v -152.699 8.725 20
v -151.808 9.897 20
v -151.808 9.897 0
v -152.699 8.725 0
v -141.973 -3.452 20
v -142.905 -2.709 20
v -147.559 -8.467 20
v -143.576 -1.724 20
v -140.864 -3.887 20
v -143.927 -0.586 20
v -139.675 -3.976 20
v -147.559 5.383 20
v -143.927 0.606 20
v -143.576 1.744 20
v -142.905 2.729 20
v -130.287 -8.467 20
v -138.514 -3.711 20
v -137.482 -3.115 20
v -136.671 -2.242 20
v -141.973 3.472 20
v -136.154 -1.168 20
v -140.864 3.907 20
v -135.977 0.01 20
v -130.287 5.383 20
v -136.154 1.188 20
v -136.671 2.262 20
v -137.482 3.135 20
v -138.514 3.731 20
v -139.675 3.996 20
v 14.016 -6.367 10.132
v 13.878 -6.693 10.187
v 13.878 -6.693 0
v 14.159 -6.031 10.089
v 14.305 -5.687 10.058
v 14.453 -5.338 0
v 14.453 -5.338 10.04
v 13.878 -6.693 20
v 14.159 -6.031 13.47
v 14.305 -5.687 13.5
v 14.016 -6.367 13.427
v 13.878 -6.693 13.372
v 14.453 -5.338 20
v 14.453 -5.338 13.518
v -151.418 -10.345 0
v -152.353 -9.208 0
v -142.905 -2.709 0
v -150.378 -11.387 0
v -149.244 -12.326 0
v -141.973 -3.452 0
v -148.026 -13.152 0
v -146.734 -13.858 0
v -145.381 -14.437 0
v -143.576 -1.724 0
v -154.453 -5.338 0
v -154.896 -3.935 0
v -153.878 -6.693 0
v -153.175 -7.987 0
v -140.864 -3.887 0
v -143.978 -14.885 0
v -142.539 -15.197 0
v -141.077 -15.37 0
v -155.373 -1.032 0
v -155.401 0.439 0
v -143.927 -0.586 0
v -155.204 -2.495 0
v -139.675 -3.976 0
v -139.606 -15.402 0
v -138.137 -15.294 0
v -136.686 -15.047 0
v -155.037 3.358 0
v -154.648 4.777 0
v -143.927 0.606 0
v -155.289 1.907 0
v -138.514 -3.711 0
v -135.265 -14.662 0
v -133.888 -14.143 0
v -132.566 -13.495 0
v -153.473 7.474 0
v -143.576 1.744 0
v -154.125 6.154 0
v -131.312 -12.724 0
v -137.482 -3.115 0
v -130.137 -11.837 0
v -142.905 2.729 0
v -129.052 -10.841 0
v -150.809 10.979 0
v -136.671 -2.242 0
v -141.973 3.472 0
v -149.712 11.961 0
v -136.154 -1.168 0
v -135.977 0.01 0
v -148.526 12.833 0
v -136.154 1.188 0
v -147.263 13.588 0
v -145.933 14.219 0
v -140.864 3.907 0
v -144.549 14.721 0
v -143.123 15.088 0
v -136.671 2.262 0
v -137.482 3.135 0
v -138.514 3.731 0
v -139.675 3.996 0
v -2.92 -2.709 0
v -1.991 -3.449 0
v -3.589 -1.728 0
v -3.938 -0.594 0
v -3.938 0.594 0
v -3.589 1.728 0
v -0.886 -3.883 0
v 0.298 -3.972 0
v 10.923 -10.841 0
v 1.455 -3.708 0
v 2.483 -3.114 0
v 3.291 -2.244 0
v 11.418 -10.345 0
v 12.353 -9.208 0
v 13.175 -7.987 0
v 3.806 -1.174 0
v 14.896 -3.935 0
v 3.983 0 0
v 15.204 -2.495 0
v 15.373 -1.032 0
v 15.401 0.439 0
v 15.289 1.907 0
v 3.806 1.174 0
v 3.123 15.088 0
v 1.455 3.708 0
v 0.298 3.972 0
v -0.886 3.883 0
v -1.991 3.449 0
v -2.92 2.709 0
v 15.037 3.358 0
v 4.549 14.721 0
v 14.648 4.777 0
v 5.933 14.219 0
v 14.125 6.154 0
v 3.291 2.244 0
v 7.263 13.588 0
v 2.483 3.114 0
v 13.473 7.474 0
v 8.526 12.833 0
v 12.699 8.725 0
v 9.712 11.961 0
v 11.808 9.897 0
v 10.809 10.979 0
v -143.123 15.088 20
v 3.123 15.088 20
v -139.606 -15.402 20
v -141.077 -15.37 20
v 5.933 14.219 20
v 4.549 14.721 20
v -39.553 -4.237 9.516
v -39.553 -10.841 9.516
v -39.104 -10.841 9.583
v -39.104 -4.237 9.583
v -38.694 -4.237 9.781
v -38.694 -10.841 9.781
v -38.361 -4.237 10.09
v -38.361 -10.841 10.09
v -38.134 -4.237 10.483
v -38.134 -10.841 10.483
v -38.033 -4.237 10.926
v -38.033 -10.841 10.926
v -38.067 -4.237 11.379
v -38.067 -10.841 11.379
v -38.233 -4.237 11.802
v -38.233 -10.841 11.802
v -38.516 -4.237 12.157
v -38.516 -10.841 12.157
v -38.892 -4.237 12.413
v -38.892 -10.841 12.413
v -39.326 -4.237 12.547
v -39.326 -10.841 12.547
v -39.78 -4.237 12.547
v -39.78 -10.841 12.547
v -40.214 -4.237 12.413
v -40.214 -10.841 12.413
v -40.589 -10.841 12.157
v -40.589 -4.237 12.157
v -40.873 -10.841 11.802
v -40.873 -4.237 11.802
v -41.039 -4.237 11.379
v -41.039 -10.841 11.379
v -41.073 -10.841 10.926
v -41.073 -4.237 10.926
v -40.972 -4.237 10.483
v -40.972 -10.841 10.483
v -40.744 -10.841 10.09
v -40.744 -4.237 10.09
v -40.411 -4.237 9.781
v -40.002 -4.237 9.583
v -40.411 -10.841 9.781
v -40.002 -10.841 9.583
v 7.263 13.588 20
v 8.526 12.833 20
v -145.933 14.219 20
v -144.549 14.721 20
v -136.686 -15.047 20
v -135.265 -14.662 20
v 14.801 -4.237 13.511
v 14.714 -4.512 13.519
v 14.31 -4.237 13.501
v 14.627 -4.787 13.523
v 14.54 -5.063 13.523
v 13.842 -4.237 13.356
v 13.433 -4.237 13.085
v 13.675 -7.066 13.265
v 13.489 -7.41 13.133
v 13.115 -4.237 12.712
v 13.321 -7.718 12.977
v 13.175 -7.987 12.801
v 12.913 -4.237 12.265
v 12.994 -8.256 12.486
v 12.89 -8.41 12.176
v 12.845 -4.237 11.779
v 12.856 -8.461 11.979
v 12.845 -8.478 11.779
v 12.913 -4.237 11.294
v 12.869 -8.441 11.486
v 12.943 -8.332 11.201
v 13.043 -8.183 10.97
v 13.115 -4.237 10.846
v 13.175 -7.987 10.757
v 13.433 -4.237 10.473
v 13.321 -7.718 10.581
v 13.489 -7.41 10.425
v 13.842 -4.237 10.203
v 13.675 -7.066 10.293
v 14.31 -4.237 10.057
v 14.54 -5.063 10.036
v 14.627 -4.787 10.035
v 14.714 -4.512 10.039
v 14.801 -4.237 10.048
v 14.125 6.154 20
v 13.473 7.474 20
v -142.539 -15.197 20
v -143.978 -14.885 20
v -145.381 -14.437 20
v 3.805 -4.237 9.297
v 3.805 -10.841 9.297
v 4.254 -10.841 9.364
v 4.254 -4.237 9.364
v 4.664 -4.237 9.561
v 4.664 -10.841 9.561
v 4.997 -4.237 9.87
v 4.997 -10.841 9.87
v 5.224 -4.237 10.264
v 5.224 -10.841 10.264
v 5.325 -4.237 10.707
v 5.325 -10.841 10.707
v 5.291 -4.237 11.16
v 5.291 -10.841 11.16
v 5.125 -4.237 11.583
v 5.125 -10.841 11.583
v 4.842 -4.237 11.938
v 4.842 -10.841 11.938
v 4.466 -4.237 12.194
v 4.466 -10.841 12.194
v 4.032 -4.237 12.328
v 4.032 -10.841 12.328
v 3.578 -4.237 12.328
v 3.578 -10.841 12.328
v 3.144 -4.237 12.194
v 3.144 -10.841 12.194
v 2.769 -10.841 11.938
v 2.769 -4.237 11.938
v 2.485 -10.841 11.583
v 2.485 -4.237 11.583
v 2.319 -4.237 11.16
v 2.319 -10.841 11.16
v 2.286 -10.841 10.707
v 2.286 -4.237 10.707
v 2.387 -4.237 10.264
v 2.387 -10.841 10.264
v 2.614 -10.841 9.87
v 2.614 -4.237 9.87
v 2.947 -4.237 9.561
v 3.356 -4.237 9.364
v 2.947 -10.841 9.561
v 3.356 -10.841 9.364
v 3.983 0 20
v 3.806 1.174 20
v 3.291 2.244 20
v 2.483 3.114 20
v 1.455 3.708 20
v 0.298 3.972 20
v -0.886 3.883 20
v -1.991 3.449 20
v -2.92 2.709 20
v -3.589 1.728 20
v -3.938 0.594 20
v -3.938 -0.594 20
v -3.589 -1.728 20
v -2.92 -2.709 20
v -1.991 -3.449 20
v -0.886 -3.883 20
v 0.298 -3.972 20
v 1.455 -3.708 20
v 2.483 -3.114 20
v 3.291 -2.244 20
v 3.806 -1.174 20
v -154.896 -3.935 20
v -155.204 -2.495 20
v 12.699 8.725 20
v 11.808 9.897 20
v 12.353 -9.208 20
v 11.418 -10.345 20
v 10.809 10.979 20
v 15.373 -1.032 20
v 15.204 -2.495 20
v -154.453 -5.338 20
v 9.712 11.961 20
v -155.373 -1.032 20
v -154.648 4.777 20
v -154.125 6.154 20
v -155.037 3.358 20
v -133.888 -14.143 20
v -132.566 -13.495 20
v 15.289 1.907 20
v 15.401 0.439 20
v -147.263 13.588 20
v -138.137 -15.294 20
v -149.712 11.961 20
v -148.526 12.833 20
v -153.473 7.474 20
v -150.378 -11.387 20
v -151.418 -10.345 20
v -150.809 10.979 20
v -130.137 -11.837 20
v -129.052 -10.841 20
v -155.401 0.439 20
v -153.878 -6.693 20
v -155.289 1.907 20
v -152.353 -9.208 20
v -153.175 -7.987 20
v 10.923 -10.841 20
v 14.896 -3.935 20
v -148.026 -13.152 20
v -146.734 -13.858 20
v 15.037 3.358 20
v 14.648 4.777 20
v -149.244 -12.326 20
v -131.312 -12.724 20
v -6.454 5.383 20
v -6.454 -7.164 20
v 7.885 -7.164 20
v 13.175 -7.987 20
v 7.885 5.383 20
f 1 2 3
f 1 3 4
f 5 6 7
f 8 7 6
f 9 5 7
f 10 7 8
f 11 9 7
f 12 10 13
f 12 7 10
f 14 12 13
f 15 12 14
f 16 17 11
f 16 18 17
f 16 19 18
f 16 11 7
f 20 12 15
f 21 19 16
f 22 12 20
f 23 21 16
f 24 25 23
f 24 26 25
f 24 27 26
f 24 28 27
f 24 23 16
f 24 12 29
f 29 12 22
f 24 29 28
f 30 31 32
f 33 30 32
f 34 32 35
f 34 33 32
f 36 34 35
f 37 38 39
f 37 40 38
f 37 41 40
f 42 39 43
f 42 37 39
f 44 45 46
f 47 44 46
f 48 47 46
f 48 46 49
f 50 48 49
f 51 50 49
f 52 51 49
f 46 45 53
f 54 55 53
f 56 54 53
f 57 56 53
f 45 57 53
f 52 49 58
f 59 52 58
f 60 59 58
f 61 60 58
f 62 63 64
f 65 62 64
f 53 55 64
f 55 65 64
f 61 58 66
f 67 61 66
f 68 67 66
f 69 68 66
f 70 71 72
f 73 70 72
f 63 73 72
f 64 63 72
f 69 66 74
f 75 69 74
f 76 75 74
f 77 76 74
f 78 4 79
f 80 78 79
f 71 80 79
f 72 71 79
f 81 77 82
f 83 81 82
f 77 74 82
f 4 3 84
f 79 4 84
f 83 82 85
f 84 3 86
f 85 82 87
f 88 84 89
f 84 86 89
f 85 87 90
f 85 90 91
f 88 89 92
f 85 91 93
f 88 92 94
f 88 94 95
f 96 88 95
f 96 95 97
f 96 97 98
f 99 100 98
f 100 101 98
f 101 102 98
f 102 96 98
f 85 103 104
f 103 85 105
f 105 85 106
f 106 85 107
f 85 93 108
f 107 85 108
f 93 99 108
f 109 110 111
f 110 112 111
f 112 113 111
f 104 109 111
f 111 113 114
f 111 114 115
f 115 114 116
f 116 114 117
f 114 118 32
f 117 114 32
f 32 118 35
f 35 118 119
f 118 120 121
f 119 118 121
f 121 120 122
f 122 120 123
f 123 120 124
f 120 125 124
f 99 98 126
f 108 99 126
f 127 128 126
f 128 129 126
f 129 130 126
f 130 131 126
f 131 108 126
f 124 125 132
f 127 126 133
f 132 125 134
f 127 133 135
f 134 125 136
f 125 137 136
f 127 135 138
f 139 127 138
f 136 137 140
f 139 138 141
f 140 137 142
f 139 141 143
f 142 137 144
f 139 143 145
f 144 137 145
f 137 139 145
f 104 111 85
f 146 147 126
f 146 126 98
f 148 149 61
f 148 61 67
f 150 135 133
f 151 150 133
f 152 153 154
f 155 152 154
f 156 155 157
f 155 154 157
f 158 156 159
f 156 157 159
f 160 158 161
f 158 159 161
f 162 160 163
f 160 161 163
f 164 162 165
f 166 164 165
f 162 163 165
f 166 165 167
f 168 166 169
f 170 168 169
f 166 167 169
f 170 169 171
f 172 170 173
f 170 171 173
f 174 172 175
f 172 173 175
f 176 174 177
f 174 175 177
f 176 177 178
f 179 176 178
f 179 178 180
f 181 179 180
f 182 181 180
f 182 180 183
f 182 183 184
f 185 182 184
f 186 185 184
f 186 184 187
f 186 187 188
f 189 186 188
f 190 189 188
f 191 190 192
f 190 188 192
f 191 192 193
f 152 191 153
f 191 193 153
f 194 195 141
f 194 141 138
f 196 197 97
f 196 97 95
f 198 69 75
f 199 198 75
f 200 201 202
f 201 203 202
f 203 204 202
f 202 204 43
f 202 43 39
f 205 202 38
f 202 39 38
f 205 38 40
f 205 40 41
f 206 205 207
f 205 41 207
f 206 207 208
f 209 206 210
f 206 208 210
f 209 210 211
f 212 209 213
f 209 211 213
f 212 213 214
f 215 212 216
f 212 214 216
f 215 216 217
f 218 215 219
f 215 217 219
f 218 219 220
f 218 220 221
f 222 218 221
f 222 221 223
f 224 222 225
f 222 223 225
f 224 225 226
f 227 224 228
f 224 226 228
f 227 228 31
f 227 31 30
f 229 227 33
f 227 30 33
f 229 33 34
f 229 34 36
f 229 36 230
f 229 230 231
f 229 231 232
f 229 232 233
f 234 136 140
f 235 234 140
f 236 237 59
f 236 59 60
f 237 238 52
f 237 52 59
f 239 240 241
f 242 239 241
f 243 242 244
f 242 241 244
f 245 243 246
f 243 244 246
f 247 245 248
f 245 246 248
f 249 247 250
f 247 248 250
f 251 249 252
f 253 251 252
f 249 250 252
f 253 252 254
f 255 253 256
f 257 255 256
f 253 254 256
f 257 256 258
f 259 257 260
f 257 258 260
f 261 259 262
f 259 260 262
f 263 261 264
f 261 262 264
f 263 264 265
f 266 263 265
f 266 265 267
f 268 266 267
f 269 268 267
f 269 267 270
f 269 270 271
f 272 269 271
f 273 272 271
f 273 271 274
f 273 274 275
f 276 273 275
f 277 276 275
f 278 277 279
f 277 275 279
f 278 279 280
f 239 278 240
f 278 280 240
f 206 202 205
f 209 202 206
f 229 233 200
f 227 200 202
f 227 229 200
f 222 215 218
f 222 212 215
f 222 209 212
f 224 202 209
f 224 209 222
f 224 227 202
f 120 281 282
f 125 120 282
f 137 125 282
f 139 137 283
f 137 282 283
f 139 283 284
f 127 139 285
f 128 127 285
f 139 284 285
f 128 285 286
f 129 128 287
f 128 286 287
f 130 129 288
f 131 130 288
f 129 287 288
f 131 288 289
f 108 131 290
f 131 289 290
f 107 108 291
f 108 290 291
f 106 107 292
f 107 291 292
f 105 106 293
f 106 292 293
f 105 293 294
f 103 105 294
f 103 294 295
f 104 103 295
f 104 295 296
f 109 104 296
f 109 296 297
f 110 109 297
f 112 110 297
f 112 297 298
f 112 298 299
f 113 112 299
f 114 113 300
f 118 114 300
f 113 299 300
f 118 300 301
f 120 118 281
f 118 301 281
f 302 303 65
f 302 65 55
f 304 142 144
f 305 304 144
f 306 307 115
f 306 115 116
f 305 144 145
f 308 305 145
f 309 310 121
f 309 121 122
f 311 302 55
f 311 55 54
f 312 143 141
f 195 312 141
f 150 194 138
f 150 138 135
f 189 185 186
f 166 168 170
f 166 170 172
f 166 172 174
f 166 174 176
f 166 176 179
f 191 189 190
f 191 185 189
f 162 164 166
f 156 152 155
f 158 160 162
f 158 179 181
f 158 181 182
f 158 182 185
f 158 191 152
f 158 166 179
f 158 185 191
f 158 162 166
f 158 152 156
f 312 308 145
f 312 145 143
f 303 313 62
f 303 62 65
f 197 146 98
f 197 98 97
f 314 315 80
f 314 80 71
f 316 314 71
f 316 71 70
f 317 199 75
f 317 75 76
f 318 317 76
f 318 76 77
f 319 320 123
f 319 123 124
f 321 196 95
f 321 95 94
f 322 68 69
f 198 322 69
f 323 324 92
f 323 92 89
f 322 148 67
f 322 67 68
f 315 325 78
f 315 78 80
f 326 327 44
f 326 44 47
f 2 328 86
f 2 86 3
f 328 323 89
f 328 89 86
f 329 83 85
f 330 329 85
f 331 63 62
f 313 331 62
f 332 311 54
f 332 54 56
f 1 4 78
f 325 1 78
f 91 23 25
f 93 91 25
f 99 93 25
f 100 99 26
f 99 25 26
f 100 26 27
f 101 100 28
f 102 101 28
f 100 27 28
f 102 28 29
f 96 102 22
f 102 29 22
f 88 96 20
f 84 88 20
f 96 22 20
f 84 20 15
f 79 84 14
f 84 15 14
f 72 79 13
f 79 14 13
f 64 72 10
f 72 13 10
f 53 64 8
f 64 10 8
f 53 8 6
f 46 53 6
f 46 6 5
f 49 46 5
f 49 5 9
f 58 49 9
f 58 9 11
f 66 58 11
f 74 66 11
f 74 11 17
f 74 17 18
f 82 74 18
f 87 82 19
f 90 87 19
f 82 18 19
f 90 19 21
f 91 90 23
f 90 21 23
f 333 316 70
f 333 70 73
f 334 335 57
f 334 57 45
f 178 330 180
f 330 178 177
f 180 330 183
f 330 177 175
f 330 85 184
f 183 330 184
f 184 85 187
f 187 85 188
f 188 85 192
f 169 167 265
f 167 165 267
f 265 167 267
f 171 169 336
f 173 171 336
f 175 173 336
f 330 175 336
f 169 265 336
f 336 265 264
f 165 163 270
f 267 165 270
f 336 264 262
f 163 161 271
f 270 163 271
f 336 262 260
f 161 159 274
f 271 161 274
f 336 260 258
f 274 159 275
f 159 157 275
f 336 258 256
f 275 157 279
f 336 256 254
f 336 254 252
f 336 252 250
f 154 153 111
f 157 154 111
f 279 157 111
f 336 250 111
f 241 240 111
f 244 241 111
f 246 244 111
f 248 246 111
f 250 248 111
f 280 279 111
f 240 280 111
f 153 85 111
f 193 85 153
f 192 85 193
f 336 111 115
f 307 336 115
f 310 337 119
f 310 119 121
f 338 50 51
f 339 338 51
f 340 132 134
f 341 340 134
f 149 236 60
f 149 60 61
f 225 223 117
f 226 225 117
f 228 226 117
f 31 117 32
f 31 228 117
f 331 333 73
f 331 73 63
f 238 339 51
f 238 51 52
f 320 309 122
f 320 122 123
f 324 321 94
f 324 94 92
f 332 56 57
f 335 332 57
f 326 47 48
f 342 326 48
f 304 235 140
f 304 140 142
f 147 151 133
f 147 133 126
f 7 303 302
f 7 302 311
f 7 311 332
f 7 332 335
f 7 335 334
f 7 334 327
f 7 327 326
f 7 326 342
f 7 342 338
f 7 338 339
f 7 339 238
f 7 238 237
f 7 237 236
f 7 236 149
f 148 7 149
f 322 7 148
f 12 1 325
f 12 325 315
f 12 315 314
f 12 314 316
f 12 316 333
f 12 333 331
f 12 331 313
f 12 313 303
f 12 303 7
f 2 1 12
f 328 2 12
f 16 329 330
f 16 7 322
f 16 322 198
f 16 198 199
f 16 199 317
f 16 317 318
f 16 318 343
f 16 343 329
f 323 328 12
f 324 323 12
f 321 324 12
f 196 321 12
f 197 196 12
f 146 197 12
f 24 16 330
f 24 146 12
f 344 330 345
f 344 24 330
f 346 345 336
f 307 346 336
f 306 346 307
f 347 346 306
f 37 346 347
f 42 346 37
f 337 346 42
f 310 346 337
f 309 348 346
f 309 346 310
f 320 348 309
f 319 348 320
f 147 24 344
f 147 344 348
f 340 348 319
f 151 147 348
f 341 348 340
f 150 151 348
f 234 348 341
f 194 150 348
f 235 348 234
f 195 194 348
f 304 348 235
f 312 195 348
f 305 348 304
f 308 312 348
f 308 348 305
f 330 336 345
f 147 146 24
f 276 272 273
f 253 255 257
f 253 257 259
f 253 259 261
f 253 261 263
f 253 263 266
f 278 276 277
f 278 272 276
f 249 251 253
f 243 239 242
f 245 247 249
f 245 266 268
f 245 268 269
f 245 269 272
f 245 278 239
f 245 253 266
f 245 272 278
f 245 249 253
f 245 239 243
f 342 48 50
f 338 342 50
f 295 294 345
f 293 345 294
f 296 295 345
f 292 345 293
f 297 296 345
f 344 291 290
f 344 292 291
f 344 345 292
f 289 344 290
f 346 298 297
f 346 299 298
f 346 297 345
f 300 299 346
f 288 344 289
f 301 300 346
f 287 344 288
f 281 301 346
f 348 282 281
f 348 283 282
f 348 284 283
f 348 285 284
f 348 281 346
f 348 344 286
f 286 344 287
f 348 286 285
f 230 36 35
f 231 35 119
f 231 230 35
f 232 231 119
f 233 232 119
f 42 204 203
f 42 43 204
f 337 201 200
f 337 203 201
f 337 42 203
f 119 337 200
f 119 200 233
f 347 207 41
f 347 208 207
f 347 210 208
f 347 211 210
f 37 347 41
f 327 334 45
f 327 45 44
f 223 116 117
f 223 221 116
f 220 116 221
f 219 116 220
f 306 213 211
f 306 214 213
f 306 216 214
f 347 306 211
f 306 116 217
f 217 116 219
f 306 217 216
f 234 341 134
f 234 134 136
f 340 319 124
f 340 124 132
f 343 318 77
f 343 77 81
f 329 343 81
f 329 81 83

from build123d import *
from OCP.BRepAlgoAPI import BRepAlgoAPI_Cut
from OCP.TopTools import TopTools_ListOfShape

# Parameters (mm, degrees)
BOSS_EXTRUDE1_DEPTH      = 19.999999553
CUT_EXTRUDE1_DEPTH       = 158.4379932
CUT_EXTRUDE2_DEPTH       = 158.4379932
SKETCH7_W                = 17.271465807
SKETCH7_H                = 13.849760317
SKETCH7_W_2              = 14.338575387
SKETCH7_H_2              = 12.546253463
BOSS_EXTRUDE4_DEPTH      = 20
SKETCH6_R                = 3.997536833
SKETCH6_R_2              = 3.982936498
CUT_EXTRUDE4_DEPTH       = 20
SPLIT1_SURFACE_1_BACK    = 175.651
SPLIT1_SURFACE_1_DEPTH   = 351.302
SPLIT1_SURFACE_2_BACK    = 175.651
SPLIT1_SURFACE_2_DEPTH   = 351.302
BODY_DELETE_KEEP_3_DEPTH = 19.999999553
SKETCH15_R               = 1.744345672
CUT_EXTRUDE8_DEPTH       = 6.604
SKETCH18_R               = 1.524
CUT_EXTRUDE10_DEPTH      = 6.604
SKETCH21_R               = 1.524
CUT_EXTRUDE12_DEPTH      = 6.604


with BuildPart() as part:
    # Sketch1 → Boss-Extrude1 (new body)
    with BuildSketch(Plane.XY.offset(19.999999553)):
        Polygon((-147.262692451, 13.588201255), (-148.526370525, 12.833039276), (-149.712219834, 11.960721575), (-150.809392333, 10.979211889), (-151.807874441, 9.897469543), (-152.69857645, 8.725371212), (-153.473347425, 7.473616395), (-154.125109315, 6.153633818), (-154.647916555, 4.777472466), (-155.037015676, 3.357697045), (-155.2888304, 1.907268073), (-155.401065946, 0.439427269), (-155.372709036, -1.032425207), (-155.203998089, -2.494852291), (-154.896497726, -3.934503533), (-154.453009367, -5.338235293), (-153.877556324, -6.69323327), (-153.175413609, -7.987127639), (-152.353018522, -9.208105505), (-151.417821646, -10.3450194), (-150.378391147, -11.387491599), (-149.244219065, -12.326003984), (-148.025646806, -13.15199025), (-146.733820438, -13.857908547), (-145.38051188, -14.437315054), (-143.978089094, -14.884918928), (-142.539337277, -15.196635388), (-141.077414155, -15.36961738), (-139.605656266, -15.402286313), (-138.137474656, -15.294345096), (-136.686325073, -15.046778135), (-135.265409946, -14.661843888), (-133.887723088, -14.143059961), (-132.565841079, -13.495159335), (-131.311833858, -12.724057771), (-130.137130618, -11.836796999), (-129.052475095, -10.841473937), (-10.947530158, -10.841473937), (-9.862869047, -11.836796999), (-8.688169532, -12.724057771), (-7.434152998, -13.495159335), (-6.112268195, -14.143059961), (-4.734582733, -14.661843888), (-3.313674591, -15.046778135), (-1.862514997, -15.294345096), (-0.394351926, -15.402286313), (1.077411231, -15.36961738), (2.539338311, -15.196635388), (3.978083376, -14.884918928), (5.380511284, -14.437315054), (6.733819377, -13.857908547), (8.025652729, -13.15199025), (9.244217537, -12.326003984), (10.378391482, -11.387491599), (11.417816393, -10.3450194), (12.35300675, -9.208105505), (13.175422326, -7.987127639), (13.877556659, -6.69323327), (14.453000389, -5.338235293), (14.896498062, -3.934503533), (15.204001218, -2.494852291), (15.372704715, -1.032425207), (15.401067212, 0.439427269), (15.288828872, 1.907268073), (15.03701508, 3.357697045), (14.647925273, 4.777472466), (14.125110582, 6.153633818), (13.473344967, 7.473616395), (12.698576786, 8.725371212), (11.807881296, 9.897469543), (10.809388012, 10.979211889), (9.71221365, 11.960721575), (8.526373655, 12.833039276), (7.262694649, 13.588201255), (5.932712927, 14.21931386), (4.548569676, 14.720613137), (3.122901777, 15.087526292), (-143.122896552, 15.087526292), (-144.548565149, 14.720613137), (-145.93270421, 14.21931386), align=None)
    extrude(amount=-BOSS_EXTRUDE1_DEPTH)

    # Sketch2 → Cut-Extrude1 (cut, through all)
    with BuildSketch(Plane(origin=(0, 0, 0), x_dir=(-1, 0, 0), z_dir=(0, 0, -1))):
        Polygon((138.905346394, 3.847302636), (138.217046857, 3.580653109), (137.589469552, 3.192068776), (137.043967843, 2.694782568), (136.599138379, 2.105728723), (136.270105839, 1.444966649), (136.068105698, 0.73499803), (136.000007391, 0), (136.068105698, -0.73499803), (136.270105839, -1.444966649), (136.599138379, -2.105728723), (137.043967843, -2.694782568), (137.589469552, -3.192068776), (138.217046857, -3.580653109), (138.905346394, -3.847302636), (139.630913734, -3.982936498), (140.369072556, -3.982936498), (141.094654799, -3.847302636), (141.782954335, -3.580653109), (142.41053164, -3.192068776), (142.956033349, -2.694782568), (143.400862813, -2.105728723), (143.729895353, -1.444966649), (143.931895494, -0.73499803), (143.999993801, 0), (143.931895494, 0.73499803), (143.729895353, 1.444966649), (143.400862813, 2.105728723), (142.956033349, 2.694782568), (142.41053164, 3.192068776), (141.782954335, 3.580653109), (141.094654799, 3.847302636), (140.369072556, 3.982936498), (139.630913734, 3.982936498), align=None)
    extrude(amount=-CUT_EXTRUDE1_DEPTH, mode=Mode.SUBTRACT)

    # Sketch3 → Cut-Extrude2 (cut, through all)
    with BuildSketch(Plane(origin=(0, 0, 0), x_dir=(-1, 0, 0), z_dir=(0, 0, -1))):
        Polygon((-2.956035547, 2.694782568), (-3.400868736, 2.105728723), (-3.729888937, 1.444966649), (-3.93189257, 0.73499803), (-4.00000019, 0), (-3.93189257, -0.73499803), (-3.729888937, -1.444966649), (-3.400868736, -2.105728723), (-2.956035547, -2.694782568), (-2.410538495, -3.192068776), (-1.78295339, -3.580653109), (-1.094651991, -3.847302636), (-0.369073445, -3.982936498), (0.369073445, -3.982936498), (1.094651991, -3.847302636), (1.78295339, -3.580653109), (2.410538495, -3.192068776), (2.956035547, -2.694782568), (3.400868736, -2.105728723), (3.729888937, -1.444966649), (3.93189257, -0.73499803), (4.00000019, 0), (3.93189257, 0.73499803), (3.729888937, 1.444966649), (3.400868736, 2.105728723), (2.956035547, 2.694782568), (2.410538495, 3.192068776), (1.78295339, 3.580653109), (1.094651991, 3.847302636), (0.369073445, 3.982936498), (-0.369073445, 3.982936498), (-1.094651991, 3.847302636), (-1.78295339, 3.580653109), (-2.410538495, 3.192068776), align=None)
    extrude(amount=-CUT_EXTRUDE2_DEPTH, mode=Mode.SUBTRACT)

    # Sketch7 → Boss-Extrude4 (add)
    with BuildSketch(Plane.XY):
        with Locations((-138.922924236, -1.542356043)):
            Rectangle(SKETCH7_W, SKETCH7_H)
        with Locations((0.715247426, -0.890602616)):
            Rectangle(SKETCH7_W_2, SKETCH7_H_2)
    extrude(amount=BOSS_EXTRUDE4_DEPTH)


with BuildPart() as cut_extrude4_tool:
    # Sketch6 → Cut-Extrude4 (new body)
    with BuildSketch(Plane.XY.offset(19.999999553)):
        with Locations((-139.974139817, 0.010018843)):
            Circle(SKETCH6_R)
        with Locations((-5.81e-07, 0)):
            Circle(SKETCH6_R_2)
    extrude(amount=-CUT_EXTRUDE4_DEPTH)


with BuildPart() as part_1:
    add(part.part)

    # Cut-Extrude4: cut by cut_extrude4_tool, with a tolerance
    cut_extrude4_stock = TopTools_ListOfShape()
    cut_extrude4_stock.Append(part_1.part.wrapped)
    cut_extrude4_tools = TopTools_ListOfShape()
    cut_extrude4_tools.Append(cut_extrude4_tool.part.wrapped)
    cut_extrude4_cut = BRepAlgoAPI_Cut()
    cut_extrude4_cut.SetArguments(cut_extrude4_stock)
    cut_extrude4_cut.SetTools(cut_extrude4_tools)
    cut_extrude4_cut.SetFuzzyValue(0.00001)
    cut_extrude4_cut.Build()
    add(Compound.cast(cut_extrude4_cut.Shape()).solids(), mode=Mode.REPLACE)


with BuildPart() as body_2:
    # Split1: the piece behind the surface
    add(part_1.part)
    # Split1 surface: a surface, the sketch's curves swept straight by 351.302 mm
    with BuildLine(Plane.XY.offset(-SPLIT1_SURFACE_1_BACK), mode=Mode.PRIVATE) as split1_surface_1_path:
        Line((-163.891257917, -10.841473937), (71.448565983, -10.841473937))
    split1_surface_1 = Shell.extrude(split1_surface_1_path.wire(), (0 * SPLIT1_SURFACE_1_DEPTH, 0 * SPLIT1_SURFACE_1_DEPTH, 1 * SPLIT1_SURFACE_1_DEPTH))
    split(bisect_by=split1_surface_1, keep=Keep.BOTTOM)

    # Body-Delete/Keep 3: read off the stored shape, not the designer's step
    # Body-Delete/Keep 3 outline → Body-Delete/Keep 3 (cut)
    with BuildSketch(Plane.XY):
        Polygon((10.92281306, -10.841473937), (-10.947530158, -10.841473937), (-9.862869047, -11.836796999), (-8.688169532, -12.724057771), (-7.434152998, -13.495159335), (-6.112268195, -14.143059961), (-4.734582733, -14.661843888), (-3.313674591, -15.046778135), (-1.862514997, -15.294345096), (-0.394351926, -15.402286313), (1.077411231, -15.36961738), (2.539338311, -15.196635388), (3.978083376, -14.884918928), (5.380511284, -14.437315054), (6.733819377, -13.857908547), (8.025652729, -13.15199025), (9.244217537, -12.326003984), (10.378391482, -11.387491599), align=None)
    extrude(amount=BODY_DELETE_KEEP_3_DEPTH, mode=Mode.SUBTRACT)


with BuildPart() as part_2:
    add(part_1.part)

    # Split1: split by a surface, the side it looks to stays
    # Split1 surface: a surface, the sketch's curves swept straight by 351.302 mm
    with BuildLine(Plane.XY.offset(-SPLIT1_SURFACE_2_BACK), mode=Mode.PRIVATE) as split1_surface_2_path:
        Line((-163.891257917, -10.841473937), (71.448565983, -10.841473937))
    split1_surface_2 = Shell.extrude(split1_surface_2_path.wire(), (0 * SPLIT1_SURFACE_2_DEPTH, 0 * SPLIT1_SURFACE_2_DEPTH, 1 * SPLIT1_SURFACE_2_DEPTH))
    split(bisect_by=split1_surface_2, keep=Keep.TOP)

    # Combine1: union body 2
    add(body_2.part)

    # Sketch15 → Cut-Extrude8 (cut)
    with BuildSketch(Plane(origin=(572.8274653, -10.841473937, -774.382334298), x_dir=(-1, 0, 0), z_dir=(0, -1, 0))):
        with Locations((558.238583002, -786.161559021)):
            Circle(SKETCH15_R)
    extrude(amount=-CUT_EXTRUDE8_DEPTH, mode=Mode.SUBTRACT)

    # Sketch18 → Cut-Extrude10 (cut)
    with BuildSketch(Plane(origin=(572.8274653, -10.841473937, -774.382334298), x_dir=(-1, 0, 0), z_dir=(0, -1, 0))):
        with Locations(Location((569.02222175, -785.202893663, 0), (0, 0, 90))):
            Circle(SKETCH18_R)
    extrude(amount=-CUT_EXTRUDE10_DEPTH, mode=Mode.SUBTRACT)

    # Sketch21 → Cut-Extrude12 (cut)
    with BuildSketch(Plane(origin=(572.8274653, -10.841473937, -774.382334298), x_dir=(-1, 0, 0), z_dir=(0, -1, 0))):
        with Locations(Location((612.380347085, -785.422094839, 0), (0, 0, 90))):
            Circle(SKETCH21_R)
    extrude(amount=-CUT_EXTRUDE12_DEPTH, mode=Mode.SUBTRACT)


solid = part_2.part
